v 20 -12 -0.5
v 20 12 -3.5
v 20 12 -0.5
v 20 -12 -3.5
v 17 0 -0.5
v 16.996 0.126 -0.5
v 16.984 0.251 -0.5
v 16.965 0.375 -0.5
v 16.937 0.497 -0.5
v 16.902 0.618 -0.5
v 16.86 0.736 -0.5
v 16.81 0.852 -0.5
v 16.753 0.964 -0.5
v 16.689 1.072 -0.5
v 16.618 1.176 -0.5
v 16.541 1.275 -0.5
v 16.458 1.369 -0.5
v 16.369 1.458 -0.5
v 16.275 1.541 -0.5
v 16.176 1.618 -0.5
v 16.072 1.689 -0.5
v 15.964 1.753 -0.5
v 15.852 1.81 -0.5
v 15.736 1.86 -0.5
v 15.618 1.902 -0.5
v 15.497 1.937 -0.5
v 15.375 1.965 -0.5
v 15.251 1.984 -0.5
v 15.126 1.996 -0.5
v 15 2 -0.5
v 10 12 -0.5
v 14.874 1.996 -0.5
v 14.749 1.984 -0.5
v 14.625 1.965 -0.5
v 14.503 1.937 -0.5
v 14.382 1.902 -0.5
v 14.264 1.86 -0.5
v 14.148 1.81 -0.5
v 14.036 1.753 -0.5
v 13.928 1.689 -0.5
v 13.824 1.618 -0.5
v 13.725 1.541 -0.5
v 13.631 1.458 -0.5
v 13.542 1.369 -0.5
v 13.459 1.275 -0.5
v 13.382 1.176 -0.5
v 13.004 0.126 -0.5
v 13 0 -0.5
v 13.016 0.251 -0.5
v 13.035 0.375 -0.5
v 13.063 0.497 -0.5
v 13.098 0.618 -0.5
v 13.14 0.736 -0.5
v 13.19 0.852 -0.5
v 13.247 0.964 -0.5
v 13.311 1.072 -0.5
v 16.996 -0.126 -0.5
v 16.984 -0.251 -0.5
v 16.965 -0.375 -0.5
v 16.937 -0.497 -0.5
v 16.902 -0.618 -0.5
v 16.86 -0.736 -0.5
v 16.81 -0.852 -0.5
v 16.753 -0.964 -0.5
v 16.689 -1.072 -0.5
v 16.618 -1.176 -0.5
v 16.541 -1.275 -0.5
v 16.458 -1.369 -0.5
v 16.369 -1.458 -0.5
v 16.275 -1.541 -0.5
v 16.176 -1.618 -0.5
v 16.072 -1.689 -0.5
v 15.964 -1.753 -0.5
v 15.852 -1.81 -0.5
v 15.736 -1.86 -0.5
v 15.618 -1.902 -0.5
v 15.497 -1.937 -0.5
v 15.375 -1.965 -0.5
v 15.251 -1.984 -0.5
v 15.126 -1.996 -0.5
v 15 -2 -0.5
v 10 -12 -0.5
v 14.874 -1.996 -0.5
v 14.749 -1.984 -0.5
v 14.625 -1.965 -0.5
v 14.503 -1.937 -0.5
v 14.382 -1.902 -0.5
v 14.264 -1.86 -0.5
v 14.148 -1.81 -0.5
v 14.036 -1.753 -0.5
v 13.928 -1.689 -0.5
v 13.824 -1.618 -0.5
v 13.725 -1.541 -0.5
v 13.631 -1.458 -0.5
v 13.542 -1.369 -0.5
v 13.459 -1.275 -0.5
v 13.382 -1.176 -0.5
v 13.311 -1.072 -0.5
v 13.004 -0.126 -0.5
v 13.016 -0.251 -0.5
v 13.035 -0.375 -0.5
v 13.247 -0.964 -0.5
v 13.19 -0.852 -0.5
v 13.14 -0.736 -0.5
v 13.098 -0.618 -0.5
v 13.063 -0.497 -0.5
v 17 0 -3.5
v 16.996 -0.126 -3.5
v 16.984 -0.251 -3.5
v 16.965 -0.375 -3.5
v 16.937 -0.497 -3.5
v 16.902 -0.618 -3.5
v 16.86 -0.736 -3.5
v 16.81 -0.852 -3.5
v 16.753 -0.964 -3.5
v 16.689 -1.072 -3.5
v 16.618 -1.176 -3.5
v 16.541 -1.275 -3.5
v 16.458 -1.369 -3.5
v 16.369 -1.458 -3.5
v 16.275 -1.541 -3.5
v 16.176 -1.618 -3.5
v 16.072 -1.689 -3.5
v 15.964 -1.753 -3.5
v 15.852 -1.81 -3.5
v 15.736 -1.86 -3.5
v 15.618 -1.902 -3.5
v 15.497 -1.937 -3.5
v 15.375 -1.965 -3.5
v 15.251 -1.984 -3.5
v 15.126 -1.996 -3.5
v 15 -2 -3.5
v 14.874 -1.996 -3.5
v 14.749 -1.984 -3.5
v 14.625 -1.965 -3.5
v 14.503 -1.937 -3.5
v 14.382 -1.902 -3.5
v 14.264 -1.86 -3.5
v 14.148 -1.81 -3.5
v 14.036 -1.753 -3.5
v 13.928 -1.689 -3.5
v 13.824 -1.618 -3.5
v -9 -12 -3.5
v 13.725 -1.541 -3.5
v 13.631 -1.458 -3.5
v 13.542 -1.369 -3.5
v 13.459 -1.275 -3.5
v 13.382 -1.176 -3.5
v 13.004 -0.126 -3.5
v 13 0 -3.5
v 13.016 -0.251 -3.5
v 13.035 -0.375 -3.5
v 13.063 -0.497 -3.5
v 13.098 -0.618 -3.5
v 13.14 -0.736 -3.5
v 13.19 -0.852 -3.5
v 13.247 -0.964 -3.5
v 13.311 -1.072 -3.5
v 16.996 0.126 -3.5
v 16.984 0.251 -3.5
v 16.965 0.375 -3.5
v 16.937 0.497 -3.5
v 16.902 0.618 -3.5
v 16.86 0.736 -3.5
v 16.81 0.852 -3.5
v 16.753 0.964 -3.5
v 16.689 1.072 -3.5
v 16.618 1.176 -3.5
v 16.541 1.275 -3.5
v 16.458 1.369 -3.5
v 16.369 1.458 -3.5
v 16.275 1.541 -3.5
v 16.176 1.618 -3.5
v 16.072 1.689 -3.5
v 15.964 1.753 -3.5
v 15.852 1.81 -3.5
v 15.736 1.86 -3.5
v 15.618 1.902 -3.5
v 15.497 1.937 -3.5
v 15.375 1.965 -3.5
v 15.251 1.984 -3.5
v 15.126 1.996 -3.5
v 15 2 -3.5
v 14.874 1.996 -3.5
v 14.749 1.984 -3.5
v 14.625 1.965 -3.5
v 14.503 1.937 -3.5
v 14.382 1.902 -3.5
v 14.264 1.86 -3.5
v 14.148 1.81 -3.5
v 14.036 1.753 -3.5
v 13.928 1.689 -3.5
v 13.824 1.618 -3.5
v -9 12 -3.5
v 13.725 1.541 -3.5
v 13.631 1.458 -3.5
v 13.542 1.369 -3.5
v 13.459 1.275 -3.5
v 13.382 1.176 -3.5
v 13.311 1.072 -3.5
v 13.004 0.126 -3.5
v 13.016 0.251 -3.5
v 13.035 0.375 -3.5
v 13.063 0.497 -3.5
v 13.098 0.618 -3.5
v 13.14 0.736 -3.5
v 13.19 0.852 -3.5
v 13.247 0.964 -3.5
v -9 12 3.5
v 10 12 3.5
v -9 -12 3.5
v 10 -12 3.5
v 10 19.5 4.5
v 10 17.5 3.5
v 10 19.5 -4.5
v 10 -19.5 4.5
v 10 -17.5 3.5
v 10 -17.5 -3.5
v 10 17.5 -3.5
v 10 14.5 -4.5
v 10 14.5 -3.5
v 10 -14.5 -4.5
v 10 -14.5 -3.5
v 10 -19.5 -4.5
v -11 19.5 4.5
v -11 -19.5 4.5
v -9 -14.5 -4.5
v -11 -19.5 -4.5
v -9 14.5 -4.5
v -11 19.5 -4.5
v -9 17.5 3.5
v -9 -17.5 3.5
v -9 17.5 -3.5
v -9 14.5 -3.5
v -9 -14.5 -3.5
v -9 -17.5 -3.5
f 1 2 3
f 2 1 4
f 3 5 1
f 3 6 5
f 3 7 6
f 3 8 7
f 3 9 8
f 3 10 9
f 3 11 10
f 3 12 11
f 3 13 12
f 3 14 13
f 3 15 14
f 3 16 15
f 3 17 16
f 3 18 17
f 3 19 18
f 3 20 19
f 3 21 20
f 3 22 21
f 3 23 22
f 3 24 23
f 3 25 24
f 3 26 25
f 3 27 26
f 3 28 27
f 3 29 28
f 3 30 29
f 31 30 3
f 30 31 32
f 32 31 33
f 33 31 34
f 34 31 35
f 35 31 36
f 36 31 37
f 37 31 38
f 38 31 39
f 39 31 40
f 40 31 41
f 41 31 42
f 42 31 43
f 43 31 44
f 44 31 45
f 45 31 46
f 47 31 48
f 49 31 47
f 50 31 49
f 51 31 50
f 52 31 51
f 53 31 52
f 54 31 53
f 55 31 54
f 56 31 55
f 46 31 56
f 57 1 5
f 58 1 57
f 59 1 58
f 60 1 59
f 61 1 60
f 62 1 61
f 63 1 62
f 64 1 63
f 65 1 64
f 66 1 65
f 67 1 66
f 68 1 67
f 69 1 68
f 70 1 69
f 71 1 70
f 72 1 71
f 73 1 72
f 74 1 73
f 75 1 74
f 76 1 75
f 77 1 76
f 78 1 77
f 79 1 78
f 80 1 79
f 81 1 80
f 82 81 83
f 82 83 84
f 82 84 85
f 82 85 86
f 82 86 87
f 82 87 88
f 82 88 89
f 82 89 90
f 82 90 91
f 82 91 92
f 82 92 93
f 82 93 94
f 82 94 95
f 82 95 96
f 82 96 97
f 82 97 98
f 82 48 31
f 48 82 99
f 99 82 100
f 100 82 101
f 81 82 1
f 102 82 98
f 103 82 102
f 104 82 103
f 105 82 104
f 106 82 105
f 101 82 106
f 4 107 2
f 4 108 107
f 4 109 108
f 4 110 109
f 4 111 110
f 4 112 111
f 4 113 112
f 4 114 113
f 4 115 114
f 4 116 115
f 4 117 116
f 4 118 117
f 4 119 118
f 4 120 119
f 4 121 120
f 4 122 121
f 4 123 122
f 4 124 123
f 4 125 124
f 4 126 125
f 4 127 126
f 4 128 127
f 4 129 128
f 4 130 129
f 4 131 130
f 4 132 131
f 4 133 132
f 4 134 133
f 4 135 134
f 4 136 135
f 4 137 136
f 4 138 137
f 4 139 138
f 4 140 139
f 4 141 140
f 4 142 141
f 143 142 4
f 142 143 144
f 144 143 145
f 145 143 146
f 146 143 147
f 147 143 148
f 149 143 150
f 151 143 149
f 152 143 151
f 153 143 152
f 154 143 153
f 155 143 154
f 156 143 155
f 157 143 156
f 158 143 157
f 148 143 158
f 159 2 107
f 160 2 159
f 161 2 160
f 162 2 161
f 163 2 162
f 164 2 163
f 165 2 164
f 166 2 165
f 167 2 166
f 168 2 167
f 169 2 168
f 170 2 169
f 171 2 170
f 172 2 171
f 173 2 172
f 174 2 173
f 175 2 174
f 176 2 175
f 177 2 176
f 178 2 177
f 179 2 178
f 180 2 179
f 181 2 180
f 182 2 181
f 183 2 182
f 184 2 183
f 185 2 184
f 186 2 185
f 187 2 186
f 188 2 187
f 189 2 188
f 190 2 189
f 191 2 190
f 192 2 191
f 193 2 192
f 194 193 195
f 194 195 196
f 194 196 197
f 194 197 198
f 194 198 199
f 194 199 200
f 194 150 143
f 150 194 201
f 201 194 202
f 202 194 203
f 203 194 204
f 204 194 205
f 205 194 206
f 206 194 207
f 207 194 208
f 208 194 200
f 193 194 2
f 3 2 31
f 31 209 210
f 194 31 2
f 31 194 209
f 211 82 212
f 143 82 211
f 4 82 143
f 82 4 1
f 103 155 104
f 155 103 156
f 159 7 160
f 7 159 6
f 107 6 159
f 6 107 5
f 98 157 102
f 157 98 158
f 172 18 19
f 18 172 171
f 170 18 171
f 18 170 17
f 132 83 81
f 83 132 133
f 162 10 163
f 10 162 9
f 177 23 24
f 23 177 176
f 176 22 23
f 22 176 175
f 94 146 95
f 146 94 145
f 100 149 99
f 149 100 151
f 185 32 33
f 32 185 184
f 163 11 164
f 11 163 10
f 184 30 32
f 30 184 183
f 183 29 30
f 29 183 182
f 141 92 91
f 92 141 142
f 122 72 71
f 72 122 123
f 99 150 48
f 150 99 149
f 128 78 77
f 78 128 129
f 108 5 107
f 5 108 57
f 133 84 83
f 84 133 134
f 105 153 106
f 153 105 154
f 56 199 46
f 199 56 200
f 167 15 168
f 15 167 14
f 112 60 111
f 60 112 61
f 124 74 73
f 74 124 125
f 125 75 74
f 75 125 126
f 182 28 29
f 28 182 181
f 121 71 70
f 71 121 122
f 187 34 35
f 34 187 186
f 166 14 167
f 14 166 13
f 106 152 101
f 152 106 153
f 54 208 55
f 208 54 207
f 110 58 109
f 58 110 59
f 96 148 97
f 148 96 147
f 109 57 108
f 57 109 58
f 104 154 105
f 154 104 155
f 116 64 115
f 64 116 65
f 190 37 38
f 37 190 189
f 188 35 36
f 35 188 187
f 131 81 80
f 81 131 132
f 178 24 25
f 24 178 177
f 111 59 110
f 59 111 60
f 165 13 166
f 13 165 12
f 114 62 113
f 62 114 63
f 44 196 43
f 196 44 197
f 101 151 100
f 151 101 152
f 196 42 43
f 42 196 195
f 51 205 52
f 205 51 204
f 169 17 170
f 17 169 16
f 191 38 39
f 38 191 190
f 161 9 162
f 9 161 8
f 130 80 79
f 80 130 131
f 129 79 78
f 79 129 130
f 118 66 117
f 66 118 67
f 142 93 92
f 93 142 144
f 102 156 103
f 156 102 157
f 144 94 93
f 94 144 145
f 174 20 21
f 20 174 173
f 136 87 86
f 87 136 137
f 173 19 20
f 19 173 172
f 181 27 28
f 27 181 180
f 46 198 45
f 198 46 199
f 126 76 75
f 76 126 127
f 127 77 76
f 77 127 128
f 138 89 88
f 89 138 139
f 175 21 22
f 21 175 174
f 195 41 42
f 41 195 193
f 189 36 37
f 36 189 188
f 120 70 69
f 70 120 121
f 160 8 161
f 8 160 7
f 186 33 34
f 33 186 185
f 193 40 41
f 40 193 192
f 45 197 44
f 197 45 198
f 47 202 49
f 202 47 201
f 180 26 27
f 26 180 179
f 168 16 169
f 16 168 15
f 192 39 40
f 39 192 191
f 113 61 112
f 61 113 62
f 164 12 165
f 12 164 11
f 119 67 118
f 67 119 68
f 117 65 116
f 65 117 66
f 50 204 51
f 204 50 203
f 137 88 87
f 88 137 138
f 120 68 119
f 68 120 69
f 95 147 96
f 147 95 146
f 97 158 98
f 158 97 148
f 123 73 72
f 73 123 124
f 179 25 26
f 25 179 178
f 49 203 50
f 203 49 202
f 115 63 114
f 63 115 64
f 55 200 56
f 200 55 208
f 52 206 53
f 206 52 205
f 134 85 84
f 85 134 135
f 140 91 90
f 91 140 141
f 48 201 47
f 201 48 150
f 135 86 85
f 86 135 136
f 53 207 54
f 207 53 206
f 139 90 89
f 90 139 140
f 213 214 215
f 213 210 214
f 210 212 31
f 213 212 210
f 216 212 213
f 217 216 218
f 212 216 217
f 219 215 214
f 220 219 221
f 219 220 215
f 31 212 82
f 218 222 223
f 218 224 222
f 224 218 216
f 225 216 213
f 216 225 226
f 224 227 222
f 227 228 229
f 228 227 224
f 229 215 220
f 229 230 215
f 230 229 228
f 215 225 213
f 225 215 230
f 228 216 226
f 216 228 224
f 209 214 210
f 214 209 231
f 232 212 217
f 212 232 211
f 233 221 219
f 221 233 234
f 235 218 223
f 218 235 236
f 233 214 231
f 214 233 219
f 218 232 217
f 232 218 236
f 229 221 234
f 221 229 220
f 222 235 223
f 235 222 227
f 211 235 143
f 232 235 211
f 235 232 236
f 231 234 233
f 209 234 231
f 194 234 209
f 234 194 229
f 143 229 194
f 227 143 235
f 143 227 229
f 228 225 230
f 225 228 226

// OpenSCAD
/*
min_height=7.52mm
width = 35 mm
railwidth = 5.1mm
inner = 24.4mm
rail_hole = 5.4mm
max_dist_zwichen_holes == 11.11mm
bogus_messy_end_length == 20mm
*/
$fn  = 100;
w=39;//35+4
h=9;
d = 20;
inner = 24;
deep = 5;
module hole() {
    cylinder(h = deep + 0.3, r = 2.0);
}
module body(){
union(){
difference(){

difference(){
cube([d,w,h], center = true);

cube([d,w-4,h-2], center = true);
}
translate([0,0,-2])cube([d,w-10,h-2], center = true);
}

cube([d,inner,h-2], center = true);
}
}

module clip(){
//clip
difference(){
translate([10,0,-2])cube([d,inner,3], center = true);
translate([15,0,-5])hole();
}}

//end_cap()
translate([-10,0,0])cube([d-18,w,h], center = true);

clip();
body();
